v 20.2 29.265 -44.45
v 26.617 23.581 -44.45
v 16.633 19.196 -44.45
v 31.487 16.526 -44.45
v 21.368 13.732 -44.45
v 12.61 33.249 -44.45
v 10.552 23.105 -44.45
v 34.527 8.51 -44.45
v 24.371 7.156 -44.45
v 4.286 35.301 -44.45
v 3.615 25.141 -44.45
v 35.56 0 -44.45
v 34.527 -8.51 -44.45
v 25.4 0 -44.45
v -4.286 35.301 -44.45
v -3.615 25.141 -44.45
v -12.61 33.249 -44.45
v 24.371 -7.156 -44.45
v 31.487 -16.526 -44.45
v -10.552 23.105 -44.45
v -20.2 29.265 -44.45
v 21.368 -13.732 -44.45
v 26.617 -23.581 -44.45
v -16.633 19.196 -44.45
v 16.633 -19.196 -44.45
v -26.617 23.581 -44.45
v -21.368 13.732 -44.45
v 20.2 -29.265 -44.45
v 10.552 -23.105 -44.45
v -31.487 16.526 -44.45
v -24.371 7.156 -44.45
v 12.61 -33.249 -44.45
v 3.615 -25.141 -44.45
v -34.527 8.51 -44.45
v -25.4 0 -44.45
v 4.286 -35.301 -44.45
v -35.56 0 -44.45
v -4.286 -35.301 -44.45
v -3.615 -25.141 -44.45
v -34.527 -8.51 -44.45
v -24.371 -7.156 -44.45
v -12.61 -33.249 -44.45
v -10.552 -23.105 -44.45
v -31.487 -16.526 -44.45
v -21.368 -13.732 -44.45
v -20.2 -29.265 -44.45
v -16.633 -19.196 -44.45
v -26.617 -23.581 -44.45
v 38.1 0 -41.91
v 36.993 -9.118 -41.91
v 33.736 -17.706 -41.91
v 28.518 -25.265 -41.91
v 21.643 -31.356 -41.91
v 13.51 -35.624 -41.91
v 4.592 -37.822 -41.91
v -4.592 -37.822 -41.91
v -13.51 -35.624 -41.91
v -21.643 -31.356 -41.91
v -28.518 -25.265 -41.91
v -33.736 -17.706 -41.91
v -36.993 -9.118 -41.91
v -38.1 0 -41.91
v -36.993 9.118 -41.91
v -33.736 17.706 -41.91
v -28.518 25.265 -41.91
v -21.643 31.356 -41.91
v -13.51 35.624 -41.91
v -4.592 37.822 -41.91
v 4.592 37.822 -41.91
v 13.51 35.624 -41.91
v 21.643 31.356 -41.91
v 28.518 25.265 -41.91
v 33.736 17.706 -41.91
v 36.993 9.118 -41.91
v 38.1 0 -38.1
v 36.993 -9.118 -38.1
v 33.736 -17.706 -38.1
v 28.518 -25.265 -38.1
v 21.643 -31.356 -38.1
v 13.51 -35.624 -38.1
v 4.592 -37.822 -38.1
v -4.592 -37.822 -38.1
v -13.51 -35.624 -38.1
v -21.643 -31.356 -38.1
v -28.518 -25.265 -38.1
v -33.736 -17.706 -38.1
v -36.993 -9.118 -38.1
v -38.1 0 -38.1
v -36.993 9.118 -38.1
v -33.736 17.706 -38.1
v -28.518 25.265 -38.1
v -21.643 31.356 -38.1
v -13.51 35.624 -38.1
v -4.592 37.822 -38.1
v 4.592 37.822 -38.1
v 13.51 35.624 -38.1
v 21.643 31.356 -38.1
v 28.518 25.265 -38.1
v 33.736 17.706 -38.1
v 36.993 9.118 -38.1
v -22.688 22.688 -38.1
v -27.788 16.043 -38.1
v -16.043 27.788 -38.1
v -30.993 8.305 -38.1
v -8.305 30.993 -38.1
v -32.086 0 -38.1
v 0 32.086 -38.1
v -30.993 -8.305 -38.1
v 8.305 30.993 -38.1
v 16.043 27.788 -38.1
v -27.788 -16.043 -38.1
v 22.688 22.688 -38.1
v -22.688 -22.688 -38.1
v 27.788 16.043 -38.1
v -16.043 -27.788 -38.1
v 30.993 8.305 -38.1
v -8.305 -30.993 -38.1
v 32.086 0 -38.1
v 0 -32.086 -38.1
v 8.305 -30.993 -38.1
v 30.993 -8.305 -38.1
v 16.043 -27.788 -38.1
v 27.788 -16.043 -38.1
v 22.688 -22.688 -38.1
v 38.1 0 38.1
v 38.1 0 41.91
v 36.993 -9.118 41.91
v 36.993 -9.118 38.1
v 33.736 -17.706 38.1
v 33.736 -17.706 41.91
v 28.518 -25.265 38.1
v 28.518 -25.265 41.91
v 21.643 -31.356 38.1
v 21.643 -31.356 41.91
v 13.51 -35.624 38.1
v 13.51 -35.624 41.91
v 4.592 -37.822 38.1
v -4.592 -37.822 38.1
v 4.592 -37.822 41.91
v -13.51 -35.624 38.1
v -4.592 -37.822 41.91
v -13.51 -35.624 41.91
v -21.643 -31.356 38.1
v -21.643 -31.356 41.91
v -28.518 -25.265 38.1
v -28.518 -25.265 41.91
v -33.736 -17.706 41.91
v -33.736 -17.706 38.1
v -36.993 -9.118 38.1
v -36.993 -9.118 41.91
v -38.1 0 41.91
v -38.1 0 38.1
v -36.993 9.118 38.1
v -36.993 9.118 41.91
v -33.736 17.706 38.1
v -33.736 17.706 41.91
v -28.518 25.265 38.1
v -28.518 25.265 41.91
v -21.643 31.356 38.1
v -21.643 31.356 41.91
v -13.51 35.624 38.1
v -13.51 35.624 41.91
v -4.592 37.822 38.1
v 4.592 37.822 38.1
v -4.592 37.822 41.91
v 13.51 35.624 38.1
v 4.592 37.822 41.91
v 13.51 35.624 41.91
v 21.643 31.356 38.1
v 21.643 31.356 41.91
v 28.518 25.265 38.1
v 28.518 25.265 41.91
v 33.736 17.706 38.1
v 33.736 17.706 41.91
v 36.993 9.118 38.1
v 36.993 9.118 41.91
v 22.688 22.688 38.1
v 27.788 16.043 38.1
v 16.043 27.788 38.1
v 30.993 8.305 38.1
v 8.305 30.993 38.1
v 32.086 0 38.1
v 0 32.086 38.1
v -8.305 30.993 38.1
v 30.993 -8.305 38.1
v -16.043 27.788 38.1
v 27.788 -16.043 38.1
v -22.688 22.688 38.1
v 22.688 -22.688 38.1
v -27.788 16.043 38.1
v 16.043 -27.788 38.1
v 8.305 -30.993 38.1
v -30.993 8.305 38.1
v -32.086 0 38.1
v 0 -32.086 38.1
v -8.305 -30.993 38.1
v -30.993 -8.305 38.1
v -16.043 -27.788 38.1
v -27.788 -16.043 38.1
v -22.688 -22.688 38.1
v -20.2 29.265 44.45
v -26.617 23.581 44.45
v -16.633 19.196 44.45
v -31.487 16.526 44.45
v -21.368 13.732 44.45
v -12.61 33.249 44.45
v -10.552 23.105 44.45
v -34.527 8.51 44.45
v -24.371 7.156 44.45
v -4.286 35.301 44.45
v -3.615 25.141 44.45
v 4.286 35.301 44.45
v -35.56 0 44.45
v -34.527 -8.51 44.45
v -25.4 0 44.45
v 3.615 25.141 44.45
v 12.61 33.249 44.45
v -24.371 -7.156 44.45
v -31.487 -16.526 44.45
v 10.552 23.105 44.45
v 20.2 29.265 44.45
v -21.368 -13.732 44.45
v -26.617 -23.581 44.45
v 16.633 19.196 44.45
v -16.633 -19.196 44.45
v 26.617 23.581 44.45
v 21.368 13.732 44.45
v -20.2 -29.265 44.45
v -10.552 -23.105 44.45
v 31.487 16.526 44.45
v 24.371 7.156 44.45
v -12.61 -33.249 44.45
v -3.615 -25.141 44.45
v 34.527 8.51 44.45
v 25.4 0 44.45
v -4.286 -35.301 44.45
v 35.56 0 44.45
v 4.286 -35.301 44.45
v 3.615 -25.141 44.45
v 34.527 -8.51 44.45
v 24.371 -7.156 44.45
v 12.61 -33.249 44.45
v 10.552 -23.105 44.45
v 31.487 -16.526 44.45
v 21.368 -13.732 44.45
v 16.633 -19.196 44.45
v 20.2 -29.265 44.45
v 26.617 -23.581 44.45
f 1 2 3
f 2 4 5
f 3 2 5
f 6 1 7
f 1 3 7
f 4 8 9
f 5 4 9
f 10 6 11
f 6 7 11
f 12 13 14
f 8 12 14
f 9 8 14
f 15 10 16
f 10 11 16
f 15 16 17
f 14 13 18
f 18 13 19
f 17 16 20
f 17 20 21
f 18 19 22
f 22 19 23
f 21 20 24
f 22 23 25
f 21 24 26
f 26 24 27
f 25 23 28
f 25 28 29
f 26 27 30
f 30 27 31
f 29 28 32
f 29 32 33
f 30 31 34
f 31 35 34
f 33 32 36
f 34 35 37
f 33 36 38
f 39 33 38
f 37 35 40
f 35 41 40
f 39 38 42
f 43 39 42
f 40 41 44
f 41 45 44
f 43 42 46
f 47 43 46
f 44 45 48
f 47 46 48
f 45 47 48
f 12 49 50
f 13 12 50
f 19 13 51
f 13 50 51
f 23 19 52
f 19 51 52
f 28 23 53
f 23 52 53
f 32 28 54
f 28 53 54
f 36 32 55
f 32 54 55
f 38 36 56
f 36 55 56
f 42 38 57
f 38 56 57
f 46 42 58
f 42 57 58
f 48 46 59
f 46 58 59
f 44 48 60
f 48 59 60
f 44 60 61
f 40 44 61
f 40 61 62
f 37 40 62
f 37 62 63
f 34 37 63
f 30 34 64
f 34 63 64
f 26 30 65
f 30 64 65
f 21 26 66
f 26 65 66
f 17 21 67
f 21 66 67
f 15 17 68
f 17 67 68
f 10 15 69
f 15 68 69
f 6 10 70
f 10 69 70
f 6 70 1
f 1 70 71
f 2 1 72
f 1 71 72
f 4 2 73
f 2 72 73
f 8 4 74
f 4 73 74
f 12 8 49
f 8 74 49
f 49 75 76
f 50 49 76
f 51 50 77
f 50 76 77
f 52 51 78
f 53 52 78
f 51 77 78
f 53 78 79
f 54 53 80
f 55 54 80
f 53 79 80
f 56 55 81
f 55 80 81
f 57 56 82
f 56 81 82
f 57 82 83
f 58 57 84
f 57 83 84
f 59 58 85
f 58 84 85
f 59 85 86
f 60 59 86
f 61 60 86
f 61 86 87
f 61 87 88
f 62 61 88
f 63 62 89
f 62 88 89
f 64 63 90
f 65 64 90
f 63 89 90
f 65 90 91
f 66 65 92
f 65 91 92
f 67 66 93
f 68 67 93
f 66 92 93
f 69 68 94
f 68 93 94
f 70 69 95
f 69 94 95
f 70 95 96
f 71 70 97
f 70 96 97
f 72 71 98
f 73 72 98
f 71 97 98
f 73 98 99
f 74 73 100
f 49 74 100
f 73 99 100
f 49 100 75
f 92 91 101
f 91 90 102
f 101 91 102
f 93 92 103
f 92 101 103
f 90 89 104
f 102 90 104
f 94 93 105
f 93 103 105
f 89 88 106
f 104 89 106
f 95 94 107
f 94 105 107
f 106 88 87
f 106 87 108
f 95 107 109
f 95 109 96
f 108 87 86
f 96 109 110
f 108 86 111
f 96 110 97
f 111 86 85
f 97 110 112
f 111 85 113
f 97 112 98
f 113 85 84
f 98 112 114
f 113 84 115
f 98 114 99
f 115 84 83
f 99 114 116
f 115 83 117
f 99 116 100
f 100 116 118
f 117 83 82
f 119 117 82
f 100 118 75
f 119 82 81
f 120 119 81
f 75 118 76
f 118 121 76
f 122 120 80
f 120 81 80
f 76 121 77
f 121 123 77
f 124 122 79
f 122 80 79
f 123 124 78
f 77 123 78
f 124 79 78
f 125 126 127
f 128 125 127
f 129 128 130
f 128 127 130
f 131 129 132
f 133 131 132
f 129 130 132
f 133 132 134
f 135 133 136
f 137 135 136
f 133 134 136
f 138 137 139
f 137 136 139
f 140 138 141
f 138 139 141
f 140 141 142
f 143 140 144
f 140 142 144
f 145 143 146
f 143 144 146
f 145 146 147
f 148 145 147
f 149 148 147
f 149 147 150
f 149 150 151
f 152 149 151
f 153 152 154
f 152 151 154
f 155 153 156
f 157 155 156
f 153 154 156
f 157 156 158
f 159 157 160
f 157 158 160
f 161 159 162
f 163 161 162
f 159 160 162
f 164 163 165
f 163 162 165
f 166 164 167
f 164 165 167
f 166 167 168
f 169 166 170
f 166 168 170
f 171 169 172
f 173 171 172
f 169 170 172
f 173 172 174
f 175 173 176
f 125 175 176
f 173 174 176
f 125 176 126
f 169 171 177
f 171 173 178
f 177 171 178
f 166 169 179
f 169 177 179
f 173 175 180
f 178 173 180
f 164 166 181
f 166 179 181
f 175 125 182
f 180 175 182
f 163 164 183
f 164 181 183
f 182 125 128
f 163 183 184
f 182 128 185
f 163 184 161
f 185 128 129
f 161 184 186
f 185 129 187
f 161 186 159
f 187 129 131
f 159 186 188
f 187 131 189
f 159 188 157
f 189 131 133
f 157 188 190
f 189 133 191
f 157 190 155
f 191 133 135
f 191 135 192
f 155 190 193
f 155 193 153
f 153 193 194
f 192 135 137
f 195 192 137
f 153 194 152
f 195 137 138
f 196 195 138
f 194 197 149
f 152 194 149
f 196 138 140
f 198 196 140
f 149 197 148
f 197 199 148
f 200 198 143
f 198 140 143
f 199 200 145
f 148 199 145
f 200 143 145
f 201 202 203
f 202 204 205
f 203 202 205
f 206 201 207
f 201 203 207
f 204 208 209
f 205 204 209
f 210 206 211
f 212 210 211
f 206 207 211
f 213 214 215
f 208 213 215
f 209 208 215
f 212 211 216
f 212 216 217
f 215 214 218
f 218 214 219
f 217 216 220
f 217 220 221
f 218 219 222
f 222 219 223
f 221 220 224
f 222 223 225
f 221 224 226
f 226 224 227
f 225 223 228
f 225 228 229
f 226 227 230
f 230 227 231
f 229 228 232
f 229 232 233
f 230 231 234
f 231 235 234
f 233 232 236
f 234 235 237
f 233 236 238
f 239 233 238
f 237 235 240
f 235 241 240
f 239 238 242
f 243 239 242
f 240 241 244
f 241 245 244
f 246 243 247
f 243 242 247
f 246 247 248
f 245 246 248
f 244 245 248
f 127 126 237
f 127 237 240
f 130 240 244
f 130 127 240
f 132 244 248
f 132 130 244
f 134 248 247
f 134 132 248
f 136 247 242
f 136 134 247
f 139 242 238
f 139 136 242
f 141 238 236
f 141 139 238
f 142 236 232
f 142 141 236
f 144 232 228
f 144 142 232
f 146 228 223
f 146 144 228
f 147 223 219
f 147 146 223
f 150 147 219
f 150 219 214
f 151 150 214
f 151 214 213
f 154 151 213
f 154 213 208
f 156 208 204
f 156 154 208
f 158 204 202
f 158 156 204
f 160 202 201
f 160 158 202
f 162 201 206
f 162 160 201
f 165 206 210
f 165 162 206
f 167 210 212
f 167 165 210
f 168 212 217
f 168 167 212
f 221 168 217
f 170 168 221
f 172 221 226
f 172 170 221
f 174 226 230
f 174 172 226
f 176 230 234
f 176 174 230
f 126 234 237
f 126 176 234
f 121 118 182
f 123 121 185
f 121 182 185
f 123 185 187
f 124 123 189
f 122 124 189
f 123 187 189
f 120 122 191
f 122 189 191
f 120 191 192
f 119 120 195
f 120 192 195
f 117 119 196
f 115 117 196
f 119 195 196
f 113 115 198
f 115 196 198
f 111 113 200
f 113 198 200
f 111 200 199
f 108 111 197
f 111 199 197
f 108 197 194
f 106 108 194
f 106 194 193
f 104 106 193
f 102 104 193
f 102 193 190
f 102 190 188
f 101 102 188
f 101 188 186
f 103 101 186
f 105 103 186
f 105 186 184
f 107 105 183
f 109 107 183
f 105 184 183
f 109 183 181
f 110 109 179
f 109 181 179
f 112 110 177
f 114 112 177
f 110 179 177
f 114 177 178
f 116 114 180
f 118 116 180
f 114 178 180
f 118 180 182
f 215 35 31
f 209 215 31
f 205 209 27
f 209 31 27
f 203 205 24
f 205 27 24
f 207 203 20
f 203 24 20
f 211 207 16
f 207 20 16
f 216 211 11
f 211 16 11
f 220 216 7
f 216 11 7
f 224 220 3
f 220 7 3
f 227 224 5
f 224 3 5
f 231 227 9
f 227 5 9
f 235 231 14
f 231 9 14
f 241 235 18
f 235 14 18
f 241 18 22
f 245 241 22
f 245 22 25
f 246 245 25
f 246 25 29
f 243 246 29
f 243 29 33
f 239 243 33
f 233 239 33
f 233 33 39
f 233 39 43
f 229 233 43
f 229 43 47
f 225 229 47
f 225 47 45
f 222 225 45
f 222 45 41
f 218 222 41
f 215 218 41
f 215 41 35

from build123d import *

# Parameters (mm, degrees)
F0_W    = 32.086309
F0_H    = 76.2
F3_D    = 50.8
F4_SIZE = 2.54


with BuildPart() as f1:
    # F0 (on Front) → F1 (revolve)
    with BuildSketch(Plane.XZ):
        Polygon((0, 44.45), (0, 38.1), (32.086309, 38.1), (38.1, 38.1), (38.1, 44.45), align=None)
        with Locations((16.043154, 0)):
            Rectangle(F0_W, F0_H)
        Polygon((32.086309, -38.1), (0, -38.1), (0, -44.45), (38.1, -44.45), (38.1, -38.1), align=None)
    revolve(axis=Axis((0, 0, 0), (0, 0, -1)))

    # F3 (through all)
    with Locations(Plane.XY.offset(44.45)):
        with Locations((0, 0)):
            Hole(F3_D / 2)

    # F4
    f4_edges = [f1.edges().sort_by_distance(p)[0] for p in [
        (-38.1, 0, 44.45),
        (-38.1, 0, -44.45),
    ]]
    chamfer(f4_edges, length=F4_SIZE)


solid = f1.part
